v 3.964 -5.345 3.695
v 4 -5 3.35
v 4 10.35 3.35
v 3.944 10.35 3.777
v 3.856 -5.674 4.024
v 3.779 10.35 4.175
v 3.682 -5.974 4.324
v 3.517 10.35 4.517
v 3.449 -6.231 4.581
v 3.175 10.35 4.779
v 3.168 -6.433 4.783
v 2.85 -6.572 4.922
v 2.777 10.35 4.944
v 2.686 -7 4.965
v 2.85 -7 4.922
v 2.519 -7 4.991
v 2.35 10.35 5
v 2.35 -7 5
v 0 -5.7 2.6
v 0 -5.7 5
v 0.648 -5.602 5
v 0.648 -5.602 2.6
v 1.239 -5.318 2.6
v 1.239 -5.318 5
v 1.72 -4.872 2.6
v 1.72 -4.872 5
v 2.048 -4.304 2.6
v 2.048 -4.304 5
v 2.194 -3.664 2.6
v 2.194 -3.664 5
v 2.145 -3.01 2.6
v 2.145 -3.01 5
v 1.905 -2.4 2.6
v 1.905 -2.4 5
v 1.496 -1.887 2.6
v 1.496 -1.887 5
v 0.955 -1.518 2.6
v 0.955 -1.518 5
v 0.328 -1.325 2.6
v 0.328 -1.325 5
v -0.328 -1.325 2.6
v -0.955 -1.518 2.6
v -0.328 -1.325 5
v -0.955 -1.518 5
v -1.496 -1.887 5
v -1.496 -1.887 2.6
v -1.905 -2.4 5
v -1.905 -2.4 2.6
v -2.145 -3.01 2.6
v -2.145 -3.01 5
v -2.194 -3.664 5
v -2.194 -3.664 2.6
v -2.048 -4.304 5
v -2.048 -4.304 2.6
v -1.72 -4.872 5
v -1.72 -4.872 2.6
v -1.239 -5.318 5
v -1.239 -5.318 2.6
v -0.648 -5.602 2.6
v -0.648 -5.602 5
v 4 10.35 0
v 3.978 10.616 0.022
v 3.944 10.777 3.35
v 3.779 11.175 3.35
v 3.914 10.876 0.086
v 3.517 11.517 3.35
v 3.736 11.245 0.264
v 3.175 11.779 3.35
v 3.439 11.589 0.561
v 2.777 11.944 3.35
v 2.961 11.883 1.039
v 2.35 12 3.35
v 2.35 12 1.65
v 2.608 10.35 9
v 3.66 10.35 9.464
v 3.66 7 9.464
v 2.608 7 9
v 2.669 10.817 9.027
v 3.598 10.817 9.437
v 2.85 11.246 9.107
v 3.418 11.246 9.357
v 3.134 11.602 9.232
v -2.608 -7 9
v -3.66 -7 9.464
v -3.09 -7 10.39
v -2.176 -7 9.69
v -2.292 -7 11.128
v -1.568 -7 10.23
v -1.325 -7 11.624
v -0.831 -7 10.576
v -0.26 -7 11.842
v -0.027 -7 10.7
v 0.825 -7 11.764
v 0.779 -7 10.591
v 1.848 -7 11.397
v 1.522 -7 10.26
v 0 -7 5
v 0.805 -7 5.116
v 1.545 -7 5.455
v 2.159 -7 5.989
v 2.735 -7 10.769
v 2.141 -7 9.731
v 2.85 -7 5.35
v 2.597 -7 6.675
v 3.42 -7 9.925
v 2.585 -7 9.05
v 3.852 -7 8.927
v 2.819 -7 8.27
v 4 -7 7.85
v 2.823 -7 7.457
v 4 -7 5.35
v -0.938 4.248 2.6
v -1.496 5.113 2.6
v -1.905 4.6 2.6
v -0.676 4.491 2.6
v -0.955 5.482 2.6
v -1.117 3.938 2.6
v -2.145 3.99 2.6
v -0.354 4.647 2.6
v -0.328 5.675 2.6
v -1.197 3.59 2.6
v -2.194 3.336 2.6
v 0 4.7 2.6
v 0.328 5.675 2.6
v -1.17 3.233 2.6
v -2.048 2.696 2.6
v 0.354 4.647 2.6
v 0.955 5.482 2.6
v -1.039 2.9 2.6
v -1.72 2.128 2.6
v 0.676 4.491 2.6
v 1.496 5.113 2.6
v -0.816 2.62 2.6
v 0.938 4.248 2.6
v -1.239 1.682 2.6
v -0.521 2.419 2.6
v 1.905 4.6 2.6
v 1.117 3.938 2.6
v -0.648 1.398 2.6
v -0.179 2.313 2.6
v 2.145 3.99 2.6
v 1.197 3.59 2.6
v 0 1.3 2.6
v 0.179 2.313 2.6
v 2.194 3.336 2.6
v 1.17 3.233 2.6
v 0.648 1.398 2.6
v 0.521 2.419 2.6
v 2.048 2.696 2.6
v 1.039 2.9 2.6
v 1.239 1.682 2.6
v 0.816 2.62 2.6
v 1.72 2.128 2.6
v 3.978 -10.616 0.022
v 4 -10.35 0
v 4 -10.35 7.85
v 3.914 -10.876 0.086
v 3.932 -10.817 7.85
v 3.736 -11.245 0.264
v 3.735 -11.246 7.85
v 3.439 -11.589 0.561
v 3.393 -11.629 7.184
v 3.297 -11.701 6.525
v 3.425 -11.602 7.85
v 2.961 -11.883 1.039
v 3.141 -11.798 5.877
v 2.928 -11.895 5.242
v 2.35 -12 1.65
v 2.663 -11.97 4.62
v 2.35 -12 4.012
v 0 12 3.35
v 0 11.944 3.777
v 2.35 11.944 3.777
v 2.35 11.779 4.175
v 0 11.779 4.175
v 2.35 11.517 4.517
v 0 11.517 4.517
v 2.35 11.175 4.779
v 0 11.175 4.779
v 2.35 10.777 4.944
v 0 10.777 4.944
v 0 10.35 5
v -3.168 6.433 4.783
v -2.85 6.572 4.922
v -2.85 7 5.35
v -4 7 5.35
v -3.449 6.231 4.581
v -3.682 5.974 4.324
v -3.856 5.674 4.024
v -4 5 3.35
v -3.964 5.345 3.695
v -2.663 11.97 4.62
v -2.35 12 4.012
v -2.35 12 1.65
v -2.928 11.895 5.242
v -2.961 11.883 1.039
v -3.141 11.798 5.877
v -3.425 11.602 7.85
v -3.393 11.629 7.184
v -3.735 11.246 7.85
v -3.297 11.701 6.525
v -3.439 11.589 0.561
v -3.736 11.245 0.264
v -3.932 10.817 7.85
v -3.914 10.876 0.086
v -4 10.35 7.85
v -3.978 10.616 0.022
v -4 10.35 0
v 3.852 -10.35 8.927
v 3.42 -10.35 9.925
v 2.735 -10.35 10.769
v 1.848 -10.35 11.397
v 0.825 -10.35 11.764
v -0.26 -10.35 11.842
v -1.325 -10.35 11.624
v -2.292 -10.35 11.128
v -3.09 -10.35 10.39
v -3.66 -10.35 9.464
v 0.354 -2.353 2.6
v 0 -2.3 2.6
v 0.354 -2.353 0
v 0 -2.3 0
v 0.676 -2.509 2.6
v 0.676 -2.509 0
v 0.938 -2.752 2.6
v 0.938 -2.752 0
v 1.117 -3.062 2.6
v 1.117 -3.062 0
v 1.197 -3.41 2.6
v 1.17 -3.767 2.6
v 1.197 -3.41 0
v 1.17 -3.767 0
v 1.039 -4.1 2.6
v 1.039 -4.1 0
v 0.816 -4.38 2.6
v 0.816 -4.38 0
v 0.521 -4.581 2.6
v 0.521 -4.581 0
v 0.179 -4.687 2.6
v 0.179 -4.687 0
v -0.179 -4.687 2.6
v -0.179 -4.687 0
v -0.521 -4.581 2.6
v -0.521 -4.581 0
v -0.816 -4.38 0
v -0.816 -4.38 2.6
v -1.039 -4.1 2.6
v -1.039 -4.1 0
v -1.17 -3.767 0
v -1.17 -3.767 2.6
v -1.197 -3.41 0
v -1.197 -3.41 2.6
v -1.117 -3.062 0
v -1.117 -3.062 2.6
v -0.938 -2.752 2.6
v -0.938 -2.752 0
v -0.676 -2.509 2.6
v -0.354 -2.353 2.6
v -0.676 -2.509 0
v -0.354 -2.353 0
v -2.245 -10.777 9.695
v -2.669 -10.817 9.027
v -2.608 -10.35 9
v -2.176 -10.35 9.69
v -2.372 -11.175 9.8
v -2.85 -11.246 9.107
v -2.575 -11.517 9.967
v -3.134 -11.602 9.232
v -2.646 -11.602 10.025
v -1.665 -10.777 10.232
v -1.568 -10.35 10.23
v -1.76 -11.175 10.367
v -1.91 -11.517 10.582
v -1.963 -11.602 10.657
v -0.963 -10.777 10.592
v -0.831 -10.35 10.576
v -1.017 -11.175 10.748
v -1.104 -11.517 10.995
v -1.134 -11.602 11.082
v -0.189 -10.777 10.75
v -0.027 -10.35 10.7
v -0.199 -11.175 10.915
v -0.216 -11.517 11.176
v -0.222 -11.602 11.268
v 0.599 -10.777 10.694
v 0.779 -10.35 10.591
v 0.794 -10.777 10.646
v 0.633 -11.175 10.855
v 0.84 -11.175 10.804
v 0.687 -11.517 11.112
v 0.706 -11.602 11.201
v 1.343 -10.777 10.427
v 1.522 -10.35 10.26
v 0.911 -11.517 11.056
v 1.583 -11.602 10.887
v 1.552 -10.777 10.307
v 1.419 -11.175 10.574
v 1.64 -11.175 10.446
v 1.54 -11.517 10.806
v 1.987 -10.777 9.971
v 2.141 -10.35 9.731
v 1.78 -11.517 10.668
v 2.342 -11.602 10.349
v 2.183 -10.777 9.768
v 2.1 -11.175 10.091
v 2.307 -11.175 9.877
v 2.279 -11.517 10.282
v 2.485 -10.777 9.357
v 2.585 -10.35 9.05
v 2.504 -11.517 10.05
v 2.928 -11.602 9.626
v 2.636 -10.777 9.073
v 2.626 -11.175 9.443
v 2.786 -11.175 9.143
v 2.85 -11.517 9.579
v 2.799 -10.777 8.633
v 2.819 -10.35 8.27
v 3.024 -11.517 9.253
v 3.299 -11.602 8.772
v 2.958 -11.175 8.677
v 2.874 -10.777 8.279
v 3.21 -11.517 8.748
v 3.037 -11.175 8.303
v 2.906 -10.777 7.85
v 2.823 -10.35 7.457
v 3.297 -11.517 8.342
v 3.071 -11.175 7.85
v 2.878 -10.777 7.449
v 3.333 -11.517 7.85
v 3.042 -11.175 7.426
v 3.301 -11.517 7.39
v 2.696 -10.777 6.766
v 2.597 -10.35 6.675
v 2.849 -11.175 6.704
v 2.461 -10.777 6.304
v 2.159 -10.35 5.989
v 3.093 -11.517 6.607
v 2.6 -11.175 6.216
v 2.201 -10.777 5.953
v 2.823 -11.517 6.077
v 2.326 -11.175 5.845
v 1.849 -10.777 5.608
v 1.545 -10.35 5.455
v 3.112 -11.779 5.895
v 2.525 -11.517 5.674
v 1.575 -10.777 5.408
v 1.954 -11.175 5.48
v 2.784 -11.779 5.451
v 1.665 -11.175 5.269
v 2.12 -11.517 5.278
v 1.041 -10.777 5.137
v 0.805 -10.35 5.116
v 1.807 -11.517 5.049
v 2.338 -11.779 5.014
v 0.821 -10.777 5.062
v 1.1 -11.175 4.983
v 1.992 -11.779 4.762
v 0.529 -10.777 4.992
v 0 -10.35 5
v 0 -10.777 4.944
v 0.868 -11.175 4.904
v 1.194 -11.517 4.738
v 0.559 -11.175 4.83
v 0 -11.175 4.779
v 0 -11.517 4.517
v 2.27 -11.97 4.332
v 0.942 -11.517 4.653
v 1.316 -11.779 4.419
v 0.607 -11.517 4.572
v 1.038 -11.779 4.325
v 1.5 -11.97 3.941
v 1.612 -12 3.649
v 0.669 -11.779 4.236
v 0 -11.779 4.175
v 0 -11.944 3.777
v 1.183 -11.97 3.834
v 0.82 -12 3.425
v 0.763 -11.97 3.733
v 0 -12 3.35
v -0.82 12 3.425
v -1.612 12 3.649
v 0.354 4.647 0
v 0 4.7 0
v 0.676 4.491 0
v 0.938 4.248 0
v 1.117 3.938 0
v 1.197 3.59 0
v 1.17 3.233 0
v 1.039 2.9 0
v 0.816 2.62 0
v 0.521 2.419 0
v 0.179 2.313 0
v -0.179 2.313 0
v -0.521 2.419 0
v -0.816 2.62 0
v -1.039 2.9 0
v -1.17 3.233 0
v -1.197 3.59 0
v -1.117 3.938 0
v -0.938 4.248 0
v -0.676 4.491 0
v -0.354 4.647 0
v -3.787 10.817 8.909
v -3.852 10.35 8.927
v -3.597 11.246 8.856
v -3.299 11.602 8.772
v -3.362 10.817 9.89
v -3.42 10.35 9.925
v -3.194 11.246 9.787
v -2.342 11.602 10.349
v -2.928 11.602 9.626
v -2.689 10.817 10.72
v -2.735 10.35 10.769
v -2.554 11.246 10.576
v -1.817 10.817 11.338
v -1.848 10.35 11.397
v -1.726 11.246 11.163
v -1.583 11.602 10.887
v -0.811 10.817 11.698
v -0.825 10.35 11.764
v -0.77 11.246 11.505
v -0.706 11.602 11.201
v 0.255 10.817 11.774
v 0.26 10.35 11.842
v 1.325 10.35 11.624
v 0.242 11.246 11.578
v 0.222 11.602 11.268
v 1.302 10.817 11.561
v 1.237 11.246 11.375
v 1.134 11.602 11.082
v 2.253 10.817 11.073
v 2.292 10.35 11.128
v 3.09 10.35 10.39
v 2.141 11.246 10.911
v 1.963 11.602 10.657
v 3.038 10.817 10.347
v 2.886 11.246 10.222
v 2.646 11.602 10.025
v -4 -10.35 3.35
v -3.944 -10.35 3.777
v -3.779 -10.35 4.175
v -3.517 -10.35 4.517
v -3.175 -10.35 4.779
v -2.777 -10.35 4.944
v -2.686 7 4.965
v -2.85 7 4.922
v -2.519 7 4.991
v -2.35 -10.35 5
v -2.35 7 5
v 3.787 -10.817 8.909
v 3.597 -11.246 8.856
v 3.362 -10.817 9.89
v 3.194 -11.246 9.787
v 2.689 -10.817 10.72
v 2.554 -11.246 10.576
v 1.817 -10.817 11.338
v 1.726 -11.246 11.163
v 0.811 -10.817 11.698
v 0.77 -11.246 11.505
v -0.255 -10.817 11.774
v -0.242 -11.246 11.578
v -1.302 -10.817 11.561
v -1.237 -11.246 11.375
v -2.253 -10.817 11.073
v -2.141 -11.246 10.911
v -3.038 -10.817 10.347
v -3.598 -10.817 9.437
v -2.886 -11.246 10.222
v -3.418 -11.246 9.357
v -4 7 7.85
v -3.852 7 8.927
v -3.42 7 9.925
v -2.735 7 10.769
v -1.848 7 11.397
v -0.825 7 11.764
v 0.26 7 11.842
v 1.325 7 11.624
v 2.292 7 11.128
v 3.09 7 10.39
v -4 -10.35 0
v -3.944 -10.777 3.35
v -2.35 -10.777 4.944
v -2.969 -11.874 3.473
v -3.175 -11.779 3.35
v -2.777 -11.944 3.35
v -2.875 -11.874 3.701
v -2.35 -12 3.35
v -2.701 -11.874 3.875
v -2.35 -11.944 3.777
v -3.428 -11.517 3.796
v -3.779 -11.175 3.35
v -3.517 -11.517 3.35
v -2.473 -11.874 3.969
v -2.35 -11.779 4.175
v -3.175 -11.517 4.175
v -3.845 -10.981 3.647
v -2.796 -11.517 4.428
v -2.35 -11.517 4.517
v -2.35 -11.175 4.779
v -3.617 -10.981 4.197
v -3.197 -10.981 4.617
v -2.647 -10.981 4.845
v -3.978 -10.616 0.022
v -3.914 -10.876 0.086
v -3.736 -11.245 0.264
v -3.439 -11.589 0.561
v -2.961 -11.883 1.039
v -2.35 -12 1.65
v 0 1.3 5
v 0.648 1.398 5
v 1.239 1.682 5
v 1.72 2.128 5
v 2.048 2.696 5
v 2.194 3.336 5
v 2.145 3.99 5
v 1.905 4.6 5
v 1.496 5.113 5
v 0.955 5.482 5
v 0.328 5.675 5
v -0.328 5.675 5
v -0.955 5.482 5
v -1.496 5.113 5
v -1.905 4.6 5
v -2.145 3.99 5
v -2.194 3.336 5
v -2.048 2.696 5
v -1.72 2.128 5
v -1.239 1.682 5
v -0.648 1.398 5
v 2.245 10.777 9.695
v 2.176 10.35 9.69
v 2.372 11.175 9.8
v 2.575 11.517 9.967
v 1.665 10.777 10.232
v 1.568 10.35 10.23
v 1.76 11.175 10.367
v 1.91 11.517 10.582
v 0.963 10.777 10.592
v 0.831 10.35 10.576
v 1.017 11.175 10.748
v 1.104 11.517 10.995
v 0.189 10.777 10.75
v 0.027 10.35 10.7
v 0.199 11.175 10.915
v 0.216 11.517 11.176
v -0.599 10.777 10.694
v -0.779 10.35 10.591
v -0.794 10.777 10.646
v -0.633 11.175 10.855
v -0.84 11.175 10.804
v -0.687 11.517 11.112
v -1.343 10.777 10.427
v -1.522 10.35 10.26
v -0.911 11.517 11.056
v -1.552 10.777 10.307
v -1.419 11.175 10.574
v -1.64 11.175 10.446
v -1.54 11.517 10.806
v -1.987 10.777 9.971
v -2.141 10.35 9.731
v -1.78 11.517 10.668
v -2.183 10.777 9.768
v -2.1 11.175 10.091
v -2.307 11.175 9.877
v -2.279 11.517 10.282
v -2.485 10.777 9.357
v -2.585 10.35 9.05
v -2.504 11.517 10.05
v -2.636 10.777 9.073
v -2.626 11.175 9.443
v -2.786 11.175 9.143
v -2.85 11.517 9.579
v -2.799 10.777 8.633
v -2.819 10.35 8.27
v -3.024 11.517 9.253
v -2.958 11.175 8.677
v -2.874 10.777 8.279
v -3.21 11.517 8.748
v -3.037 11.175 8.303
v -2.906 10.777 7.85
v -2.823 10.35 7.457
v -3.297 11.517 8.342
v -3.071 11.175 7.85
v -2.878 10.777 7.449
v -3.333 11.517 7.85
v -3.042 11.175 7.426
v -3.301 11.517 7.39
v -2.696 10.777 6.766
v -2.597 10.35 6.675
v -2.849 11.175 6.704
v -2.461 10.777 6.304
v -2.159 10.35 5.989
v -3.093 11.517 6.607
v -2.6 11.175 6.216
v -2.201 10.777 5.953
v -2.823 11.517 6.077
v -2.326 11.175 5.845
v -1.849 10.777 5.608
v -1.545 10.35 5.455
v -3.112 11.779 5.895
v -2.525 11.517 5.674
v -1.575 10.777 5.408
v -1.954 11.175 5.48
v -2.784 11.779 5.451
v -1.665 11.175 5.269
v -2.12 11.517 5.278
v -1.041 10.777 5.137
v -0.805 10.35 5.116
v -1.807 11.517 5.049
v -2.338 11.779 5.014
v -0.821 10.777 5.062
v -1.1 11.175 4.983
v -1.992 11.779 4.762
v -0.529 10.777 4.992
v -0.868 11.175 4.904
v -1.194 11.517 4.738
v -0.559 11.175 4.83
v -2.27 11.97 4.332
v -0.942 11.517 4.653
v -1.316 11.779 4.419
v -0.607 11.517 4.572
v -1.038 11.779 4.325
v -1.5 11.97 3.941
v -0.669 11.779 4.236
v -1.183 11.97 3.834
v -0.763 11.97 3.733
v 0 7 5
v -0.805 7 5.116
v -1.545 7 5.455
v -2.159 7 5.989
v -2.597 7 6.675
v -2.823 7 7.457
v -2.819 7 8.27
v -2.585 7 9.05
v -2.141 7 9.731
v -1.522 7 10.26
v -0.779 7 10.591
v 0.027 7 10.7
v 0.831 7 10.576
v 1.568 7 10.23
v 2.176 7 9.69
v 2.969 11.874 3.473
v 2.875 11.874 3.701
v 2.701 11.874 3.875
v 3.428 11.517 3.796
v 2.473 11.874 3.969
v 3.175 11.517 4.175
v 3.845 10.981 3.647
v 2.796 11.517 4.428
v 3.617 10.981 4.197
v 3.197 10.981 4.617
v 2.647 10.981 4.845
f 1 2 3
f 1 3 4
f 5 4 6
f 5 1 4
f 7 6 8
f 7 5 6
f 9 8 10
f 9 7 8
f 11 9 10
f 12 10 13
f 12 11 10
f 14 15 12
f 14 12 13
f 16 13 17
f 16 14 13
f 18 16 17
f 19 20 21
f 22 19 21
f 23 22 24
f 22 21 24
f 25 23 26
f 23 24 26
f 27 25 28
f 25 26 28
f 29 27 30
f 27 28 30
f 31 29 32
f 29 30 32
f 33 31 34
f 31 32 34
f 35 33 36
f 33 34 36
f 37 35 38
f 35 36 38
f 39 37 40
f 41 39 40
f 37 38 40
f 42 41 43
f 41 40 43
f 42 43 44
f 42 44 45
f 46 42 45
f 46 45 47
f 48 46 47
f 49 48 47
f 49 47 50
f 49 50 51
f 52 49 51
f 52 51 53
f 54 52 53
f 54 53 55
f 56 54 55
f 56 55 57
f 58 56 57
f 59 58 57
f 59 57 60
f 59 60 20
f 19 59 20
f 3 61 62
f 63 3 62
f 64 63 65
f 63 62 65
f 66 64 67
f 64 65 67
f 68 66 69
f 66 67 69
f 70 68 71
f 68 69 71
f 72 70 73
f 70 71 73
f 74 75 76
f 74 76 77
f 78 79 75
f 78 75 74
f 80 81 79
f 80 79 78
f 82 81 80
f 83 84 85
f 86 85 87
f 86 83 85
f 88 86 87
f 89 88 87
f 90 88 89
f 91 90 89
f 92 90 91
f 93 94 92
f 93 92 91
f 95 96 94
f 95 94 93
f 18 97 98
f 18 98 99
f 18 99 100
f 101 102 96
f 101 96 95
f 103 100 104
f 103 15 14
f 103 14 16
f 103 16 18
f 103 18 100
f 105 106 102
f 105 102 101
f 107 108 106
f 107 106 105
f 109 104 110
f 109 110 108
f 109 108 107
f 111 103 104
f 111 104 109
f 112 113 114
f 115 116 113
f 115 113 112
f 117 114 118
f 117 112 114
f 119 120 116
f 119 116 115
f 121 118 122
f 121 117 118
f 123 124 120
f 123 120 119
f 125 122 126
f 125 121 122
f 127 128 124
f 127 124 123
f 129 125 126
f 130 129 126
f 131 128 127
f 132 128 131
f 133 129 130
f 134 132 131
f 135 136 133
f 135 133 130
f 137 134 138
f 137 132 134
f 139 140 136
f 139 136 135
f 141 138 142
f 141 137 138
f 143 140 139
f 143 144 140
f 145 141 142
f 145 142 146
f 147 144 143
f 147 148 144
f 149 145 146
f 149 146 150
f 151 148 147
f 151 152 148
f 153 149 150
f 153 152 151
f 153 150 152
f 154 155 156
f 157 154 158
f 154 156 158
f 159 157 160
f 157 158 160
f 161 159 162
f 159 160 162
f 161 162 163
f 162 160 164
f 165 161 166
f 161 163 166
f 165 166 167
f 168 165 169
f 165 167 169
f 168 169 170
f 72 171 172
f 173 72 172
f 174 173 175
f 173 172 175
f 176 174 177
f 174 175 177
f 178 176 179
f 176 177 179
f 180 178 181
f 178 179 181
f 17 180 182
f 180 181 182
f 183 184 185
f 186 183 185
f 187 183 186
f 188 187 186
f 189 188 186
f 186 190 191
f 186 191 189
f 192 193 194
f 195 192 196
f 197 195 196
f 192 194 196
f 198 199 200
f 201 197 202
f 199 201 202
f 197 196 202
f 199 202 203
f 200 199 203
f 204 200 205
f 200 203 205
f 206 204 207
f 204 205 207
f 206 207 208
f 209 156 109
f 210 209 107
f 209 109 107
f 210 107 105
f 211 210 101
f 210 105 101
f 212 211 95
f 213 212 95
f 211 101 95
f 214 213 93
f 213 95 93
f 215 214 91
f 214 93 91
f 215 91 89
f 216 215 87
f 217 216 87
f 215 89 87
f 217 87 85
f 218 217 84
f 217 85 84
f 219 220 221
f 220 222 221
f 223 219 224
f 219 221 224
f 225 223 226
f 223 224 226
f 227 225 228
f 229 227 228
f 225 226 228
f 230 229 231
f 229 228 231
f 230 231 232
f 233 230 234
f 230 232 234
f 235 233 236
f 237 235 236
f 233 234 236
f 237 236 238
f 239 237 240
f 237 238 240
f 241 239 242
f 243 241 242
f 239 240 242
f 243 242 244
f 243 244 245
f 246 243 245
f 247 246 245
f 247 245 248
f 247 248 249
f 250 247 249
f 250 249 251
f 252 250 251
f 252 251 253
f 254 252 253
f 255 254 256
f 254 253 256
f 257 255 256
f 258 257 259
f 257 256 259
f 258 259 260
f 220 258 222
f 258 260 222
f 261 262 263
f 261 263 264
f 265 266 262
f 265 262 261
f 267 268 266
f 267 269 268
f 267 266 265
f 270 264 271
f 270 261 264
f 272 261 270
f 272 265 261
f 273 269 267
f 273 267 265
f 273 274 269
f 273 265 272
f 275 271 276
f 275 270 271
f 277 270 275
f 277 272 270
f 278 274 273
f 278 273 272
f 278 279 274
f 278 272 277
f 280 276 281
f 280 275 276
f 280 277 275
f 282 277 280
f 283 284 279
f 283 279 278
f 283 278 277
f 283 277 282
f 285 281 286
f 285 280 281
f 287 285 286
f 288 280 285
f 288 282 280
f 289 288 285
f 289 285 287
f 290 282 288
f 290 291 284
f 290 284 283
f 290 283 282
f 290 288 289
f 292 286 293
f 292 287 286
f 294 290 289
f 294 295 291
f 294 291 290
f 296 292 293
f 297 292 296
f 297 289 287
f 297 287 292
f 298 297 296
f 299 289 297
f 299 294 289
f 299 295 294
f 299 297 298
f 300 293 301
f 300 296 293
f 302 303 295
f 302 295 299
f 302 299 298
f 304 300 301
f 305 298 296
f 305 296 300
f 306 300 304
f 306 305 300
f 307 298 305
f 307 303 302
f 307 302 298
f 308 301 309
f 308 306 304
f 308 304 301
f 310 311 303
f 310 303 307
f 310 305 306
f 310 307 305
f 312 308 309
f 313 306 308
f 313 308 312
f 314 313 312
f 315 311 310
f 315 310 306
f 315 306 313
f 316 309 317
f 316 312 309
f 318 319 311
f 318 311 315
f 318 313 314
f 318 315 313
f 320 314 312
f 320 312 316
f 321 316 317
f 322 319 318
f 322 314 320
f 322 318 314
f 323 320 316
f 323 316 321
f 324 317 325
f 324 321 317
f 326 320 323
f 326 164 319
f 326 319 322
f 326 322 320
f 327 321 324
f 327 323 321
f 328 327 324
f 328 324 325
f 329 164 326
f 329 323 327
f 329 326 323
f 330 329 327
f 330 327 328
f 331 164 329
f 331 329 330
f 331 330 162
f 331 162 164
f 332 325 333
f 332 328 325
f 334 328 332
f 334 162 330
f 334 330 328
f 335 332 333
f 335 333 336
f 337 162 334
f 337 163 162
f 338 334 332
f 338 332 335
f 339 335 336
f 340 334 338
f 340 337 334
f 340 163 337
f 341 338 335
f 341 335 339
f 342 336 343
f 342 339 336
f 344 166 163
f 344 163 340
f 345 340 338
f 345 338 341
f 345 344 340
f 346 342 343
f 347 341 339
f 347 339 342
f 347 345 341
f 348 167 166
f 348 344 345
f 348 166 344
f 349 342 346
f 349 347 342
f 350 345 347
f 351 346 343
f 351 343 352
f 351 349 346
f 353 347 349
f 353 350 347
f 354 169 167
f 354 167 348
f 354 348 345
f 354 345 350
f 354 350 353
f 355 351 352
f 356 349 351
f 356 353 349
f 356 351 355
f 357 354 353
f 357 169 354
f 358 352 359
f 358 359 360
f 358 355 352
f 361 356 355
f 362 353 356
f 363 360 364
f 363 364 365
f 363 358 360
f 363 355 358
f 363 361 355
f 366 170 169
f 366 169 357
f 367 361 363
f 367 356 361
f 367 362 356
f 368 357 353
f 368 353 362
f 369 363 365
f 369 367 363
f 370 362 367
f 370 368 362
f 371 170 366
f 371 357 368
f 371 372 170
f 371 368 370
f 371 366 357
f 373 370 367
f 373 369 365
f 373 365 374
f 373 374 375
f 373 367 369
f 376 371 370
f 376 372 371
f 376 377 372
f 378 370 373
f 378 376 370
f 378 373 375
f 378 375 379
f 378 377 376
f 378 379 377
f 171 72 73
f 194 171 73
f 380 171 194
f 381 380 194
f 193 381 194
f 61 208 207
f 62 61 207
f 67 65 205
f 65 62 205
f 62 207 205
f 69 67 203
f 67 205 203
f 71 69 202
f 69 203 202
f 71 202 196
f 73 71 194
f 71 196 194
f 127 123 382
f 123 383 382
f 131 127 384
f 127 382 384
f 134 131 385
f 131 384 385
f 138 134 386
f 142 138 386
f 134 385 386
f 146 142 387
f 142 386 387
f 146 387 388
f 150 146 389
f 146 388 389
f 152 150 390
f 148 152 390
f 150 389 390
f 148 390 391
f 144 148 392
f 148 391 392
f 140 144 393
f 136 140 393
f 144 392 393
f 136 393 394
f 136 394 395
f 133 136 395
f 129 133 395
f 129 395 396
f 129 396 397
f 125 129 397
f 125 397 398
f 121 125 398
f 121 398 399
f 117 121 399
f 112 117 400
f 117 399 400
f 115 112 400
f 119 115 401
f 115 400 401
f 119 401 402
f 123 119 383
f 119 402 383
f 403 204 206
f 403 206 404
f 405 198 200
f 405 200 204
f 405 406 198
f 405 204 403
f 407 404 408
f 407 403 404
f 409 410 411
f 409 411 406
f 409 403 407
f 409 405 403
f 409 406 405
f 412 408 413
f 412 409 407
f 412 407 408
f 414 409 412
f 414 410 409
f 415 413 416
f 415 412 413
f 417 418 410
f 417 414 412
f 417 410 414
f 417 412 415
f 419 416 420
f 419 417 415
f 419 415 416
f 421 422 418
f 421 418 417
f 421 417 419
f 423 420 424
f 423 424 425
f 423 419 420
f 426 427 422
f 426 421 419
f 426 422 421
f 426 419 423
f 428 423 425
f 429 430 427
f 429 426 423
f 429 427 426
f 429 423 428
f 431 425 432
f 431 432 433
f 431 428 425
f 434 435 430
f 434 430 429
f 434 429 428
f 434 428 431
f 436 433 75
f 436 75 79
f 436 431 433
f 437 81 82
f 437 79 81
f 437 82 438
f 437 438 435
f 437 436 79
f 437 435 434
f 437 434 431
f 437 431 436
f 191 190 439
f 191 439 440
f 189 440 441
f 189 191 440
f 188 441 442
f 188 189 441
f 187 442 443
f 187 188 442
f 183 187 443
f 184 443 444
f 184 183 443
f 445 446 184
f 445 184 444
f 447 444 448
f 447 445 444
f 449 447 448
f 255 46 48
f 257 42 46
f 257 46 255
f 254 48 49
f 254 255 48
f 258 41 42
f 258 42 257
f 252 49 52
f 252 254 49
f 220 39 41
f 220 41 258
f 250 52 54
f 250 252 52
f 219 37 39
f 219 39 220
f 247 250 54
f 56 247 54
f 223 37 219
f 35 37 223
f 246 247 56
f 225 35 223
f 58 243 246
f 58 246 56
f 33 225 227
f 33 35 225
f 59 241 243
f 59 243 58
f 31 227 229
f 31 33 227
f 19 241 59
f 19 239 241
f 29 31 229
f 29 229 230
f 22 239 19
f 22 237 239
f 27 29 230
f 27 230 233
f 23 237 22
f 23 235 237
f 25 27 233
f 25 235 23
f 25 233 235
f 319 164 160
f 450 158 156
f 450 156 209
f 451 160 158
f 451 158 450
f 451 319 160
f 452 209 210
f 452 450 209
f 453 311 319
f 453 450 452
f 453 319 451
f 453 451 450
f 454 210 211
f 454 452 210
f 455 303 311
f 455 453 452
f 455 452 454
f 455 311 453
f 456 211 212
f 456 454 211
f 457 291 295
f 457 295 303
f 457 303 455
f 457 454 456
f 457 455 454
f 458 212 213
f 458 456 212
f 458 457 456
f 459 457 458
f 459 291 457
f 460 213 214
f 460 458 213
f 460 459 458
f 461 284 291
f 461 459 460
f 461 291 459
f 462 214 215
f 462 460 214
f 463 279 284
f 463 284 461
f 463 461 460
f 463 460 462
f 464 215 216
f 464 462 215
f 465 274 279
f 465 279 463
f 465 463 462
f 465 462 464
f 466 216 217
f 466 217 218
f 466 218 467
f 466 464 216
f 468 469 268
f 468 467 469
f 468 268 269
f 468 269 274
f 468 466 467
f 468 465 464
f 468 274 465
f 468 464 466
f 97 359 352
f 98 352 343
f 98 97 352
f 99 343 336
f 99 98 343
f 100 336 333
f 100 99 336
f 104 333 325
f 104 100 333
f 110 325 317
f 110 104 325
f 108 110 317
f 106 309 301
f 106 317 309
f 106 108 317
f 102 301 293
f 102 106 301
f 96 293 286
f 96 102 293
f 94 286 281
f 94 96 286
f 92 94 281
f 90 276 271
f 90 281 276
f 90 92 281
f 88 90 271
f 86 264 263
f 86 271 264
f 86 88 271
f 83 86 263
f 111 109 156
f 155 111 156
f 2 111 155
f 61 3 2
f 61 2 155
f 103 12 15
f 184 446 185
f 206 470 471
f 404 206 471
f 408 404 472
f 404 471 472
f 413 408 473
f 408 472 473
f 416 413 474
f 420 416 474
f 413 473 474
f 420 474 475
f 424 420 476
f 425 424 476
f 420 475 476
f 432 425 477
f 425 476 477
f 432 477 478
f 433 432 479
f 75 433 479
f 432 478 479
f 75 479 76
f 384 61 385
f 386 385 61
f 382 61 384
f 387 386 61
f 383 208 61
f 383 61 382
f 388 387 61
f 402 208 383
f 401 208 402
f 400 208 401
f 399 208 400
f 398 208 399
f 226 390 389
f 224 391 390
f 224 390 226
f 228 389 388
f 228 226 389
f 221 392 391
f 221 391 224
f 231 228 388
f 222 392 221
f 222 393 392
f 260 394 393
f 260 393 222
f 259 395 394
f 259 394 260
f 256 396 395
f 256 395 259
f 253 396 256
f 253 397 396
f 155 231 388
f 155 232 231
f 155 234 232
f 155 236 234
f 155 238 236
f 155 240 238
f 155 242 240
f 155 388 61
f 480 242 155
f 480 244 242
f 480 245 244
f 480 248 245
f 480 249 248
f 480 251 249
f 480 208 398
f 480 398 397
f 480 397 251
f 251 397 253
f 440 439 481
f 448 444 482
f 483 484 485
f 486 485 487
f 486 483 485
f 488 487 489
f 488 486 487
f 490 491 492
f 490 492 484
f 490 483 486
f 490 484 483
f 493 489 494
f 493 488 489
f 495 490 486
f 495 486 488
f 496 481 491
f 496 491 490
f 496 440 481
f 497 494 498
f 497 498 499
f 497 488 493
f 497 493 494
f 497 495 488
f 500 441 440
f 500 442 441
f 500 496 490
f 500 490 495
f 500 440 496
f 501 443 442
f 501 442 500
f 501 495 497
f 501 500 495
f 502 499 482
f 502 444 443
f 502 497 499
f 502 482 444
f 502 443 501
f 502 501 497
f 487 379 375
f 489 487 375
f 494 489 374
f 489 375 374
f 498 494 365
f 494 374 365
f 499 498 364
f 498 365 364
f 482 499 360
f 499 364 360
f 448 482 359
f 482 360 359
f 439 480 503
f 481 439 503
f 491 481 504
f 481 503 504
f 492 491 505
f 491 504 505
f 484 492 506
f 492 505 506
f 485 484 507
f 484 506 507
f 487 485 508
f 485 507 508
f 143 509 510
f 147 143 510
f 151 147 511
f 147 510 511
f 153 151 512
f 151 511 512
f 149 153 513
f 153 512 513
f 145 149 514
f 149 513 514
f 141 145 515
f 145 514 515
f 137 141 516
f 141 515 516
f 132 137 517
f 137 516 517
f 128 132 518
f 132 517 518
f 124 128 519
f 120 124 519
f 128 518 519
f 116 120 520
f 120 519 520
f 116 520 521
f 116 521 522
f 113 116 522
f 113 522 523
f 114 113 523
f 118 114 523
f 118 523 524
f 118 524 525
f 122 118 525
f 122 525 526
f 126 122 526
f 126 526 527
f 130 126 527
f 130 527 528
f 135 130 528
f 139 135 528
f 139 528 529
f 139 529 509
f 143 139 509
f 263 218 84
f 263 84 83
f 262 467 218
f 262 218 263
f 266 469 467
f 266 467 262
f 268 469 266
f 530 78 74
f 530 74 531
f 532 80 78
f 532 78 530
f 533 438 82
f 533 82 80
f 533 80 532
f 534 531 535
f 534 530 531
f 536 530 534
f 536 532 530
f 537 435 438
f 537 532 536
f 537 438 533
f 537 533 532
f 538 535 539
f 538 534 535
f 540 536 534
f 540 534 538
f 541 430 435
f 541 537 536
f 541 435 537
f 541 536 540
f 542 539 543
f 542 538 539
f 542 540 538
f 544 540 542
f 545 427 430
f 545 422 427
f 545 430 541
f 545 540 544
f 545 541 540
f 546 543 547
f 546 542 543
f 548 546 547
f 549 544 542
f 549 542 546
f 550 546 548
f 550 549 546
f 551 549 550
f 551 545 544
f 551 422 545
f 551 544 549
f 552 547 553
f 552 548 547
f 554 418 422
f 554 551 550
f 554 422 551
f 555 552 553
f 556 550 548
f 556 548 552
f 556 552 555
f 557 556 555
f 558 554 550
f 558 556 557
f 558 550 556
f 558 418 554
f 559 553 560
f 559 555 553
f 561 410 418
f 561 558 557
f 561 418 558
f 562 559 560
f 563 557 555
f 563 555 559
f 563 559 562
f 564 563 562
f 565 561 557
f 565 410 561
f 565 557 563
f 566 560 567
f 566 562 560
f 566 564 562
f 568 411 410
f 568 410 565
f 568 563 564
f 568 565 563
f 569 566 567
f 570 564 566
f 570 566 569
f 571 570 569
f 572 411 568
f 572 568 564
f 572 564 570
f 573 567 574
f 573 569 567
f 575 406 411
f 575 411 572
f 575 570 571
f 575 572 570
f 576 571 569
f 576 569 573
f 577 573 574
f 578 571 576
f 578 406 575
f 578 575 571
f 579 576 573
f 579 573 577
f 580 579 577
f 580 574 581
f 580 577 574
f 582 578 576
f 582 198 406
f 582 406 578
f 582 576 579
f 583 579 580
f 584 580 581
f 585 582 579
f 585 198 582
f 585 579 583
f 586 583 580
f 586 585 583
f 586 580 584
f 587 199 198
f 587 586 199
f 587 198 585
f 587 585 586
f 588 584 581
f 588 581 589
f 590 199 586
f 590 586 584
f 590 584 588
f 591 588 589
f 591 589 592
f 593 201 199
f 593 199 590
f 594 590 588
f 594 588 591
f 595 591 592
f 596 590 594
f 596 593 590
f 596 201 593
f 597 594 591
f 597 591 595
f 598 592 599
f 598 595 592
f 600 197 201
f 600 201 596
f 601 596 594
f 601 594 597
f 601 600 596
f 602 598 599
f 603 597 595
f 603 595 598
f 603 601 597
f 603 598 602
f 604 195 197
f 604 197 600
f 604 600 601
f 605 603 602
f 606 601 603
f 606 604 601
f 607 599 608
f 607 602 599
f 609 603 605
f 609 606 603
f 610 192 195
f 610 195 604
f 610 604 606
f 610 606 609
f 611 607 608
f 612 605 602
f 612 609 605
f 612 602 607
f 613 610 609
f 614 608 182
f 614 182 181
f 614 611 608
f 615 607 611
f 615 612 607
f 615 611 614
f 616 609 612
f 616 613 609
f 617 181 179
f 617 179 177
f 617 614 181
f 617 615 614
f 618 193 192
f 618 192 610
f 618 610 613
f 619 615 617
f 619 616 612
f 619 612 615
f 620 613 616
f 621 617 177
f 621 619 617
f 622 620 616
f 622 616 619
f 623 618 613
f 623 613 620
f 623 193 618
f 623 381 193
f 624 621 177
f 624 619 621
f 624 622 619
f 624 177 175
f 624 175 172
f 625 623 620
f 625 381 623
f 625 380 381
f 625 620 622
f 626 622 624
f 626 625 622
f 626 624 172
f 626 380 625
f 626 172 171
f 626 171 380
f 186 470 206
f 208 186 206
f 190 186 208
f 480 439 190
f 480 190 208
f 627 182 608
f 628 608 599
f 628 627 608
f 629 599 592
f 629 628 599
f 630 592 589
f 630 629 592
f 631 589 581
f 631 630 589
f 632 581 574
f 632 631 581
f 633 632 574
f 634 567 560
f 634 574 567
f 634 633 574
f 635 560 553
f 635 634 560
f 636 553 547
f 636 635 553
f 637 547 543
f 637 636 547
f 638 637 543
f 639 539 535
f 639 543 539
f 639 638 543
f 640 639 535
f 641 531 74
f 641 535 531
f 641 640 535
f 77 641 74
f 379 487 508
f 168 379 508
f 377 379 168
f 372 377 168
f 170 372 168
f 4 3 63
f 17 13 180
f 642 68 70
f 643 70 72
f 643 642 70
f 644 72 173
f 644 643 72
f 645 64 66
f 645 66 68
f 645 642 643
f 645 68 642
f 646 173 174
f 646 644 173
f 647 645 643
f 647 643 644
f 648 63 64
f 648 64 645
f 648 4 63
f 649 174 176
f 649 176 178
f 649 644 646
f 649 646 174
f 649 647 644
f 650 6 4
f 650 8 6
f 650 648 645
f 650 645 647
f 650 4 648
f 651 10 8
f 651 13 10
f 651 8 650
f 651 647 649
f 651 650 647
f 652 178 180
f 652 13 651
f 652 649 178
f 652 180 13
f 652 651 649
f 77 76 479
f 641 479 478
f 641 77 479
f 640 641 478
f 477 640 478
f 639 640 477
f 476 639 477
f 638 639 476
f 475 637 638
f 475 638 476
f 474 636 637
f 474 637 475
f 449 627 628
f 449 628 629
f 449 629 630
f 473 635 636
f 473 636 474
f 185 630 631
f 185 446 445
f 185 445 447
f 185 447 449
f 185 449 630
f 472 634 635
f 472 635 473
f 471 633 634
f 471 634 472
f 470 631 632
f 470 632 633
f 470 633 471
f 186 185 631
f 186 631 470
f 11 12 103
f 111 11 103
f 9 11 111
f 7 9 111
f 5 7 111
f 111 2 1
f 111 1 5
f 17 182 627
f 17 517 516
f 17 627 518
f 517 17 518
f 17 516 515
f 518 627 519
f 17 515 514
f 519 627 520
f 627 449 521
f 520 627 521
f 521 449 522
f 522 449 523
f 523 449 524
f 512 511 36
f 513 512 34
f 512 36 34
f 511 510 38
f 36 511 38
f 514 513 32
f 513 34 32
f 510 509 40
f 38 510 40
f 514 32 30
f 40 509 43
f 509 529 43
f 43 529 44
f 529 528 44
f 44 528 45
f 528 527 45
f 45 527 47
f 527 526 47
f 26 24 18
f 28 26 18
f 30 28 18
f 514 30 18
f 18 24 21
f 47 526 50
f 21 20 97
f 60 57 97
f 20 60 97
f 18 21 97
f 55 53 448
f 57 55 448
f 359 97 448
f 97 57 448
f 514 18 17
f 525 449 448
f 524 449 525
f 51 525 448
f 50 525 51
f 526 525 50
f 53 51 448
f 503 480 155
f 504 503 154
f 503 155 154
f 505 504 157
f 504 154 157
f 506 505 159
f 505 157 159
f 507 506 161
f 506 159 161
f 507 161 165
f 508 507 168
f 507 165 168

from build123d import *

# Parameters (mm, degrees)
BASE_DEPTH                                          = 5
BASE_FILLET_R                                       = 1.65
HOOK_BASE_REACH                                     = 15.601
HOOK_BASE_END_RADIUS                                = 1.65
CBORE_FOR_M2_HEX_SOCKET_HEAD_CAP_SCREW1_D           = 2.4
CBORE_FOR_M2_HEX_SOCKET_HEAD_CAP_SCREW1_DEPTH       = 7.25
CBORE_FOR_M2_HEX_SOCKET_HEAD_CAP_SCREW1_CBORE_D     = 4.4
CBORE_FOR_M2_HEX_SOCKET_HEAD_CAP_SCREW1_CBORE_DEPTH = 2.4
CBORE_FOR_M2_HEX_SOCKET_HEAD_CAP_SCREW1_TIP         = 0.7210327428330723
SKETCH16_W                                          = 5.000000000000002
SKETCH16_H                                          = 1.65
SKETCH6_W                                           = 1.1499999999999981
SKETCH6_H                                           = 2.0000000000000004
CUT_EXTRUDE4_DEPTH                                  = 7.85
CIRPATTERN1_COUNT                                   = 2
FILLET1_R                                           = 1.65


with BuildPart() as part:
    # Sketch1 → Base (new body)
    # profile 1 of 2: a face of its own
    with BuildSketch(Plane(origin=(0, 0, 0), x_dir=(0, 1, 0), z_dir=(0, 0, 1))):
        Polygon((12.000000000000002, 4), (12.000000000000004, -3.9999999999999947), (-12, -4), (-12.000000000000002, 4), align=None)
        Polygon((-10, 2.35), (10, 2.35), (10, -2.35), (-9.999999999999998, -2.35), align=None, mode=Mode.SUBTRACT)
    # profile 2 of 2: a face of its own
    with BuildSketch(Plane(origin=(0, 0, 0), x_dir=(0, 1, 0), z_dir=(0, 0, 1))):
        Polygon((10, 2.35), (10, -2.35), (-9.999999999999998, -2.35), (-10, 2.35), align=None)
    extrude(amount=BASE_DEPTH)

    # Base-Fillet
    base_fillet_edges = [part.edges().sort_by_distance(p)[0] for p in [
        (-4, 0, 5),
        (3.9999999999999973, 1.78e-15, 5),
    ]]
    fillet(base_fillet_edges, radius=BASE_FILLET_R)

    # Hook Base: up to this cylinder (the profile starts outside it)
    hook_base_end = Plane(origin=(-2.35, 9.5, 3.35), z_dir=(0, 1, 0)) * Cylinder(HOOK_BASE_END_RADIUS, 35.502, mode=Mode.PRIVATE)
    # Sketch - Hook Base → Hook Base (add, up to the surface)
    with BuildSketch(Plane.XY.offset(5), mode=Mode.PRIVATE) as hook_base_sk1:
        Polygon((-4, 12.000000000000002), (-2.850000000000002, 12.000000000000004), (-2.850000000000002, 7.000000000000002), (-3.9999999999999982, 7.000000000000002), align=None)
    hook_base_tool1 = extrude(hook_base_sk1.sketch, amount=-HOOK_BASE_REACH, mode=Mode.PRIVATE) - hook_base_end
    hook_base = hook_base_tool1.solids().sort_by_distance((-3.425, 9.5, 5))[0]
    add(hook_base)

    # Hook: sweep along a path in Hook Path
    with BuildLine(Plane(origin=(-2.6e-15, 12.000000000000004, 0), x_dir=(-1, -2.2e-16, 0), z_dir=(-2.2e-16, 1, 0))) as hook_path:
        Line((2.849999999999999, 5.000000000000002), (2.85, 7.850000000000001))
        ThreePointArc((2.85, 7.850000000000001), (0.5876262664606571, 10.638762336766174), (-2.6076809620810604, 9.000000000000002))
    # Sketch - Hook Base<3> → Hook (sweep)
    with BuildSketch(Plane.XY.offset(5)):
        Polygon((-4, 12.000000000000002), (-2.850000000000002, 12.000000000000004), (-2.850000000000002, 7.000000000000002), (-3.9999999999999982, 7.000000000000002), align=None)
    hook = sweep(path=hook_path.line)

    # CBORE for M2 Hex Socket Head Cap Screw1
    with Locations(Plane(origin=(0, 0, 5), x_dir=(0, -1, 0), z_dir=(0, 0, 1))):
        with Locations((3.5, 0), (-3.5, 0)):
            CounterBoreHole(CBORE_FOR_M2_HEX_SOCKET_HEAD_CAP_SCREW1_D / 2, CBORE_FOR_M2_HEX_SOCKET_HEAD_CAP_SCREW1_CBORE_D / 2, CBORE_FOR_M2_HEX_SOCKET_HEAD_CAP_SCREW1_CBORE_DEPTH, depth=CBORE_FOR_M2_HEX_SOCKET_HEAD_CAP_SCREW1_DEPTH)
            with Locations((0, 0, -(CBORE_FOR_M2_HEX_SOCKET_HEAD_CAP_SCREW1_DEPTH + CBORE_FOR_M2_HEX_SOCKET_HEAD_CAP_SCREW1_TIP / 2))):  # 118° drill point
                Cone(0, CBORE_FOR_M2_HEX_SOCKET_HEAD_CAP_SCREW1_D / 2, CBORE_FOR_M2_HEX_SOCKET_HEAD_CAP_SCREW1_TIP, mode=Mode.SUBTRACT)

    # Sweep1: sweep along a path in Sketch15
    with BuildLine(Plane(origin=(-2.6e-15, 12.000000000000004, 0), x_dir=(-1, -2.2e-16, 0), z_dir=(-2.2e-16, 1, 0))) as sweep1_path:
        ThreePointArc((-8.7e-16, 5), (2.0152543263816596, 5.83474567361834), (2.849999999999999, 7.85))
    # Sketch16 → Sweep1 (sweep)
    with BuildSketch(Plane.YZ):
        with Locations((9.500000000000004, 4.175)):
            Rectangle(SKETCH16_W, SKETCH16_H)
    sweep1 = sweep(path=sweep1_path.line)

    # Sweep - Hook Rib: sweep along a path in Sketch8
    with BuildLine(Plane.YZ.offset(-3.425000000000001)) as sweep_hook_rib_path:
        Line((7.000000000000002, 5.3500000000000005), (4.999999999999995, 3.35))
    # Sketch6 → Sweep - Hook Rib (sweep)
    with BuildSketch(Plane.XZ.offset(-7.000000000000002)):
        with Locations((-3.4250000000000007, 4.3500000000000005)):
            Rectangle(SKETCH6_W, SKETCH6_H)
    sweep_hook_rib = sweep(path=sweep_hook_rib_path.line)

    # Sketch19 → Cut-Extrude4 (cut)
    with BuildSketch(Plane.XY.offset(7.85)):
        Polygon((-3.999999999999999, 7.000000000000002), (-3.999999999999999, 12.000000000000004), (-4.500000000000001, 12.000000000000002), (-4.499999999999999, 7.000000000000001), align=None)
    cut_extrude4 = extrude(amount=-CUT_EXTRUDE4_DEPTH, mode=Mode.SUBTRACT)

    # CirPattern1: Hook Base, Hook, Sweep1, Sweep - Hook Rib, Cut-Extrude4 ×2 about axis
    cirpattern1_axis = Axis((-6e-16, 1.16e-15, 0), (0, 0, 1))
    add([hook_base.rotate(cirpattern1_axis, i * 360 / CIRPATTERN1_COUNT) for i in range(1, CIRPATTERN1_COUNT)])
    add([hook.rotate(cirpattern1_axis, i * 360 / CIRPATTERN1_COUNT) for i in range(1, CIRPATTERN1_COUNT)])
    add([sweep1.rotate(cirpattern1_axis, i * 360 / CIRPATTERN1_COUNT) for i in range(1, CIRPATTERN1_COUNT)])
    add([sweep_hook_rib.rotate(cirpattern1_axis, i * 360 / CIRPATTERN1_COUNT) for i in range(1, CIRPATTERN1_COUNT)])
    add([cut_extrude4.rotate(cirpattern1_axis, i * 360 / CIRPATTERN1_COUNT) for i in range(1, CIRPATTERN1_COUNT)], mode=Mode.SUBTRACT)

    # Fillet1
    # the kernel refuses this fillet: 1.65 mm, written as the material it takes off along each edge
    with BuildSketch(Plane(origin=(-3.999999999999999, -12.000000000000002, -4.125000000000005), x_dir=(1, 0, 0), z_dir=(0, 0, 1))) as fillet1_piece_1:
        with BuildLine():
            CenterArc((FILLET1_R, FILLET1_R), FILLET1_R, 179.99999999999994, 90.00000000000006)
            Line((0, FILLET1_R), (0, 0))
            Line((0, 0), (FILLET1_R, 0))
        make_face()
    extrude(amount=7.475000000000006, mode=Mode.SUBTRACT)
    with BuildSketch(Plane(origin=(3.7e-16, -12.000000000000002, 7.850000000000004), x_dir=(-0.5093397654793319, 0, -0.8605655136603251), z_dir=(0.8605655136603251, 0, -0.5093397654793319))) as fillet1_piece_2:
        with BuildLine():
            CenterArc((2.8500000000000036 + FILLET1_R, FILLET1_R), FILLET1_R, 180, 90)
            Line((2.8500000000000036, FILLET1_R), (2.8500000000000036, 0))
            Line((2.8500000000000036, 0), (2.8500000000000036 + FILLET1_R, 0))
        make_face()
    revolve(axis=Axis((3.7e-16, -12.000000000000002, 7.850000000000004), (0, 1, 0)), revolution_arc=329.3801381453189, mode=Mode.SUBTRACT)
    with BuildSketch(Plane(origin=(3.9999999999999947, 12.000000000000004, -4.125000000000001), x_dir=(-1, 0, 0), z_dir=(0, 0, 1))) as fillet1_piece_3:
        with BuildLine():
            CenterArc((FILLET1_R, FILLET1_R), FILLET1_R, 180, 90)
            Line((-8.9e-16, FILLET1_R), (0, 0))
            Line((0, 0), (FILLET1_R, 0))
        make_face()
    extrude(amount=7.475000000000001, mode=Mode.SUBTRACT)
    with BuildSketch(Plane(origin=(3.9999999999999987, -12, 7.85), x_dir=(5.4e-16, 1, 0), z_dir=(-6e-17, 0, -1))) as fillet1_piece_4:
        with BuildLine():
            CenterArc((FILLET1_R, -FILLET1_R), FILLET1_R, 89.99999999999997, 90.00000000000003)
            Line((8.9e-16, -FILLET1_R), (0, 0))
            Line((0, 0), (FILLET1_R, 0))
        make_face()
    extrude(amount=11.975000000000005, mode=Mode.SUBTRACT)
    with BuildSketch(Plane(origin=(-2.66e-15, -12.000000000000002, 5), x_dir=(0, 0, -1), z_dir=(-1, -2.2e-16, 0))) as fillet1_piece_5:
        with BuildLine():
            CenterArc((FILLET1_R, -FILLET1_R), FILLET1_R, 90, 90)
            Line((0, -FILLET1_R), (0, 0))
            Line((0, 0), (FILLET1_R, 0))
        make_face()
    extrude(amount=2.349999999999998, mode=Mode.SUBTRACT)
    with BuildSketch(Plane(origin=(-3.05e-15, 12.000000000000004, 7.850000000000004), x_dir=(0.5093397654793319, 0, -0.8605655136603251), z_dir=(-0.8605655136603251, 0, -0.5093397654793319))) as fillet1_piece_6:
        with BuildLine():
            CenterArc((2.8500000000000036 + FILLET1_R, FILLET1_R), FILLET1_R, 180, 90)
            Line((2.8500000000000036, FILLET1_R), (2.8500000000000036, 0))
            Line((2.8500000000000036, 0), (2.8500000000000036 + FILLET1_R, 0))
        make_face()
    revolve(axis=Axis((-3.05e-15, 12.000000000000004, 7.850000000000004), (0, -1, 0)), revolution_arc=329.3801381453189, mode=Mode.SUBTRACT)
    with BuildSketch(Plane(origin=(8.125, -11.999999999999998, 0), x_dir=(0, 0, 1), z_dir=(-1, -2.2e-16, 0))) as fillet1_piece_7:
        with BuildLine():
            CenterArc((FILLET1_R, FILLET1_R), FILLET1_R, 180, 90)
            Line((-2.2e-16, FILLET1_R), (0, 0))
            Line((0, 0), (FILLET1_R, 0))
        make_face()
    extrude(amount=16.25, mode=Mode.SUBTRACT)
    with BuildSketch(Plane(origin=(-8.125, 12, 0), x_dir=(0, 0, 1), z_dir=(1, 2.2e-16, 0))) as fillet1_piece_8:
        with BuildLine():
            CenterArc((FILLET1_R, FILLET1_R), FILLET1_R, 180, 90)
            Line((-2.2e-16, FILLET1_R), (0, 0))
            Line((0, 0), (FILLET1_R, 0))
        make_face()
    extrude(amount=16.249999999999993, mode=Mode.SUBTRACT)
    with BuildSketch(Plane(origin=(0, 12.000000000000004, 5), x_dir=(0, 0, -1), z_dir=(1, 2.2e-16, 0))) as fillet1_piece_9:
        with BuildLine():
            CenterArc((FILLET1_R, -FILLET1_R), FILLET1_R, 90, 90)
            Line((0, -FILLET1_R), (0, 0))
            Line((0, 0), (FILLET1_R, 0))
        make_face()
    extrude(amount=2.349999999999995, mode=Mode.SUBTRACT)
    with BuildSketch(Plane(origin=(-3.999999999999999, 12.000000000000002, -4.124999999999998), x_dir=(1, 0, 2.3e-16), z_dir=(-2.3e-16, -4.5e-16, 1))) as fillet1_piece_10:
        with BuildLine():
            CenterArc((FILLET1_R, -FILLET1_R), FILLET1_R, 90.00000000000001, 89.99999999999999)
            Line((0, -FILLET1_R), (0, 0))
            Line((0, 0), (FILLET1_R, 0))
        make_face()
    extrude(amount=11.974999999999998, mode=Mode.SUBTRACT)
    with BuildSketch(Plane(origin=(3.7e-16, -12, 7.850000000000004), x_dir=(1, 0, -1.33e-15), z_dir=(-1.33e-15, 0, -1))) as fillet1_piece_11:
        with BuildLine():
            CenterArc((3.9999999999999982 - FILLET1_R, -FILLET1_R), FILLET1_R, 6.168e-14, 89.99999999999994)
            Line((3.9999999999999982, -FILLET1_R), (3.9999999999999982, 0))
            Line((3.9999999999999982, 0), (3.9999999999999982 - FILLET1_R, 0))
        make_face()
    revolve(axis=Axis((3.7e-16, -12, 7.850000000000004), (-1.2e-16, -1, 0)), revolution_arc=215.36009714129503, mode=Mode.SUBTRACT)
    with BuildSketch(Plane(origin=(2.349999999999995, 12.000000000000004, 3.3500000000000005), x_dir=(1, 0, 0), z_dir=(0, 0, -1))) as fillet1_piece_12:
        with BuildLine():
            CenterArc((1.65 - FILLET1_R, FILLET1_R), FILLET1_R, 270, 90.00000000000001)
            Line((1.6500000000000004, FILLET1_R), (1.65, 0))
            Line((1.65, 0), (1.65 - FILLET1_R, 0))
        make_face()
    revolve(axis=Axis((2.349999999999995, 12.000000000000004, 3.3500000000000005), (2.2e-16, -1, 0)), revolution_arc=90, mode=Mode.SUBTRACT)
    with BuildSketch(Plane(origin=(-2.3500000000000005, -12, 3.3500000000000005), x_dir=(-1, 0, -2.7e-16), z_dir=(2.7e-16, 0, -1))) as fillet1_piece_13:
        with BuildLine():
            CenterArc((1.6499999999999995 - FILLET1_R, FILLET1_R), FILLET1_R, 270, 90.00000000000007)
            Line((1.6499999999999995, FILLET1_R), (1.6499999999999995, 0))
            Line((1.6499999999999995, 0), (1.6499999999999995 - FILLET1_R, -1.78e-15))
        make_face()
    revolve(axis=Axis((-2.3500000000000005, -12, 3.3500000000000005), (0, 1, 0)), revolution_arc=90, mode=Mode.SUBTRACT)
    with BuildSketch(Plane(origin=(-3.05e-15, 12.000000000000002, 7.850000000000004), x_dir=(-1, 0, -1.33e-15), z_dir=(1.33e-15, 0, -1))) as fillet1_piece_14:
        with BuildLine():
            CenterArc((3.9999999999999987 - FILLET1_R, -FILLET1_R), FILLET1_R, 0, 90)
            Line((3.9999999999999987, -FILLET1_R), (3.9999999999999987, 0))
            Line((3.9999999999999987, 0), (3.9999999999999987 - FILLET1_R, 0))
        make_face()
    revolve(axis=Axis((-3.05e-15, 12.000000000000002, 7.850000000000004), (0, 1, 0)), revolution_arc=215.36009714129503, mode=Mode.SUBTRACT)


solid = part.part
